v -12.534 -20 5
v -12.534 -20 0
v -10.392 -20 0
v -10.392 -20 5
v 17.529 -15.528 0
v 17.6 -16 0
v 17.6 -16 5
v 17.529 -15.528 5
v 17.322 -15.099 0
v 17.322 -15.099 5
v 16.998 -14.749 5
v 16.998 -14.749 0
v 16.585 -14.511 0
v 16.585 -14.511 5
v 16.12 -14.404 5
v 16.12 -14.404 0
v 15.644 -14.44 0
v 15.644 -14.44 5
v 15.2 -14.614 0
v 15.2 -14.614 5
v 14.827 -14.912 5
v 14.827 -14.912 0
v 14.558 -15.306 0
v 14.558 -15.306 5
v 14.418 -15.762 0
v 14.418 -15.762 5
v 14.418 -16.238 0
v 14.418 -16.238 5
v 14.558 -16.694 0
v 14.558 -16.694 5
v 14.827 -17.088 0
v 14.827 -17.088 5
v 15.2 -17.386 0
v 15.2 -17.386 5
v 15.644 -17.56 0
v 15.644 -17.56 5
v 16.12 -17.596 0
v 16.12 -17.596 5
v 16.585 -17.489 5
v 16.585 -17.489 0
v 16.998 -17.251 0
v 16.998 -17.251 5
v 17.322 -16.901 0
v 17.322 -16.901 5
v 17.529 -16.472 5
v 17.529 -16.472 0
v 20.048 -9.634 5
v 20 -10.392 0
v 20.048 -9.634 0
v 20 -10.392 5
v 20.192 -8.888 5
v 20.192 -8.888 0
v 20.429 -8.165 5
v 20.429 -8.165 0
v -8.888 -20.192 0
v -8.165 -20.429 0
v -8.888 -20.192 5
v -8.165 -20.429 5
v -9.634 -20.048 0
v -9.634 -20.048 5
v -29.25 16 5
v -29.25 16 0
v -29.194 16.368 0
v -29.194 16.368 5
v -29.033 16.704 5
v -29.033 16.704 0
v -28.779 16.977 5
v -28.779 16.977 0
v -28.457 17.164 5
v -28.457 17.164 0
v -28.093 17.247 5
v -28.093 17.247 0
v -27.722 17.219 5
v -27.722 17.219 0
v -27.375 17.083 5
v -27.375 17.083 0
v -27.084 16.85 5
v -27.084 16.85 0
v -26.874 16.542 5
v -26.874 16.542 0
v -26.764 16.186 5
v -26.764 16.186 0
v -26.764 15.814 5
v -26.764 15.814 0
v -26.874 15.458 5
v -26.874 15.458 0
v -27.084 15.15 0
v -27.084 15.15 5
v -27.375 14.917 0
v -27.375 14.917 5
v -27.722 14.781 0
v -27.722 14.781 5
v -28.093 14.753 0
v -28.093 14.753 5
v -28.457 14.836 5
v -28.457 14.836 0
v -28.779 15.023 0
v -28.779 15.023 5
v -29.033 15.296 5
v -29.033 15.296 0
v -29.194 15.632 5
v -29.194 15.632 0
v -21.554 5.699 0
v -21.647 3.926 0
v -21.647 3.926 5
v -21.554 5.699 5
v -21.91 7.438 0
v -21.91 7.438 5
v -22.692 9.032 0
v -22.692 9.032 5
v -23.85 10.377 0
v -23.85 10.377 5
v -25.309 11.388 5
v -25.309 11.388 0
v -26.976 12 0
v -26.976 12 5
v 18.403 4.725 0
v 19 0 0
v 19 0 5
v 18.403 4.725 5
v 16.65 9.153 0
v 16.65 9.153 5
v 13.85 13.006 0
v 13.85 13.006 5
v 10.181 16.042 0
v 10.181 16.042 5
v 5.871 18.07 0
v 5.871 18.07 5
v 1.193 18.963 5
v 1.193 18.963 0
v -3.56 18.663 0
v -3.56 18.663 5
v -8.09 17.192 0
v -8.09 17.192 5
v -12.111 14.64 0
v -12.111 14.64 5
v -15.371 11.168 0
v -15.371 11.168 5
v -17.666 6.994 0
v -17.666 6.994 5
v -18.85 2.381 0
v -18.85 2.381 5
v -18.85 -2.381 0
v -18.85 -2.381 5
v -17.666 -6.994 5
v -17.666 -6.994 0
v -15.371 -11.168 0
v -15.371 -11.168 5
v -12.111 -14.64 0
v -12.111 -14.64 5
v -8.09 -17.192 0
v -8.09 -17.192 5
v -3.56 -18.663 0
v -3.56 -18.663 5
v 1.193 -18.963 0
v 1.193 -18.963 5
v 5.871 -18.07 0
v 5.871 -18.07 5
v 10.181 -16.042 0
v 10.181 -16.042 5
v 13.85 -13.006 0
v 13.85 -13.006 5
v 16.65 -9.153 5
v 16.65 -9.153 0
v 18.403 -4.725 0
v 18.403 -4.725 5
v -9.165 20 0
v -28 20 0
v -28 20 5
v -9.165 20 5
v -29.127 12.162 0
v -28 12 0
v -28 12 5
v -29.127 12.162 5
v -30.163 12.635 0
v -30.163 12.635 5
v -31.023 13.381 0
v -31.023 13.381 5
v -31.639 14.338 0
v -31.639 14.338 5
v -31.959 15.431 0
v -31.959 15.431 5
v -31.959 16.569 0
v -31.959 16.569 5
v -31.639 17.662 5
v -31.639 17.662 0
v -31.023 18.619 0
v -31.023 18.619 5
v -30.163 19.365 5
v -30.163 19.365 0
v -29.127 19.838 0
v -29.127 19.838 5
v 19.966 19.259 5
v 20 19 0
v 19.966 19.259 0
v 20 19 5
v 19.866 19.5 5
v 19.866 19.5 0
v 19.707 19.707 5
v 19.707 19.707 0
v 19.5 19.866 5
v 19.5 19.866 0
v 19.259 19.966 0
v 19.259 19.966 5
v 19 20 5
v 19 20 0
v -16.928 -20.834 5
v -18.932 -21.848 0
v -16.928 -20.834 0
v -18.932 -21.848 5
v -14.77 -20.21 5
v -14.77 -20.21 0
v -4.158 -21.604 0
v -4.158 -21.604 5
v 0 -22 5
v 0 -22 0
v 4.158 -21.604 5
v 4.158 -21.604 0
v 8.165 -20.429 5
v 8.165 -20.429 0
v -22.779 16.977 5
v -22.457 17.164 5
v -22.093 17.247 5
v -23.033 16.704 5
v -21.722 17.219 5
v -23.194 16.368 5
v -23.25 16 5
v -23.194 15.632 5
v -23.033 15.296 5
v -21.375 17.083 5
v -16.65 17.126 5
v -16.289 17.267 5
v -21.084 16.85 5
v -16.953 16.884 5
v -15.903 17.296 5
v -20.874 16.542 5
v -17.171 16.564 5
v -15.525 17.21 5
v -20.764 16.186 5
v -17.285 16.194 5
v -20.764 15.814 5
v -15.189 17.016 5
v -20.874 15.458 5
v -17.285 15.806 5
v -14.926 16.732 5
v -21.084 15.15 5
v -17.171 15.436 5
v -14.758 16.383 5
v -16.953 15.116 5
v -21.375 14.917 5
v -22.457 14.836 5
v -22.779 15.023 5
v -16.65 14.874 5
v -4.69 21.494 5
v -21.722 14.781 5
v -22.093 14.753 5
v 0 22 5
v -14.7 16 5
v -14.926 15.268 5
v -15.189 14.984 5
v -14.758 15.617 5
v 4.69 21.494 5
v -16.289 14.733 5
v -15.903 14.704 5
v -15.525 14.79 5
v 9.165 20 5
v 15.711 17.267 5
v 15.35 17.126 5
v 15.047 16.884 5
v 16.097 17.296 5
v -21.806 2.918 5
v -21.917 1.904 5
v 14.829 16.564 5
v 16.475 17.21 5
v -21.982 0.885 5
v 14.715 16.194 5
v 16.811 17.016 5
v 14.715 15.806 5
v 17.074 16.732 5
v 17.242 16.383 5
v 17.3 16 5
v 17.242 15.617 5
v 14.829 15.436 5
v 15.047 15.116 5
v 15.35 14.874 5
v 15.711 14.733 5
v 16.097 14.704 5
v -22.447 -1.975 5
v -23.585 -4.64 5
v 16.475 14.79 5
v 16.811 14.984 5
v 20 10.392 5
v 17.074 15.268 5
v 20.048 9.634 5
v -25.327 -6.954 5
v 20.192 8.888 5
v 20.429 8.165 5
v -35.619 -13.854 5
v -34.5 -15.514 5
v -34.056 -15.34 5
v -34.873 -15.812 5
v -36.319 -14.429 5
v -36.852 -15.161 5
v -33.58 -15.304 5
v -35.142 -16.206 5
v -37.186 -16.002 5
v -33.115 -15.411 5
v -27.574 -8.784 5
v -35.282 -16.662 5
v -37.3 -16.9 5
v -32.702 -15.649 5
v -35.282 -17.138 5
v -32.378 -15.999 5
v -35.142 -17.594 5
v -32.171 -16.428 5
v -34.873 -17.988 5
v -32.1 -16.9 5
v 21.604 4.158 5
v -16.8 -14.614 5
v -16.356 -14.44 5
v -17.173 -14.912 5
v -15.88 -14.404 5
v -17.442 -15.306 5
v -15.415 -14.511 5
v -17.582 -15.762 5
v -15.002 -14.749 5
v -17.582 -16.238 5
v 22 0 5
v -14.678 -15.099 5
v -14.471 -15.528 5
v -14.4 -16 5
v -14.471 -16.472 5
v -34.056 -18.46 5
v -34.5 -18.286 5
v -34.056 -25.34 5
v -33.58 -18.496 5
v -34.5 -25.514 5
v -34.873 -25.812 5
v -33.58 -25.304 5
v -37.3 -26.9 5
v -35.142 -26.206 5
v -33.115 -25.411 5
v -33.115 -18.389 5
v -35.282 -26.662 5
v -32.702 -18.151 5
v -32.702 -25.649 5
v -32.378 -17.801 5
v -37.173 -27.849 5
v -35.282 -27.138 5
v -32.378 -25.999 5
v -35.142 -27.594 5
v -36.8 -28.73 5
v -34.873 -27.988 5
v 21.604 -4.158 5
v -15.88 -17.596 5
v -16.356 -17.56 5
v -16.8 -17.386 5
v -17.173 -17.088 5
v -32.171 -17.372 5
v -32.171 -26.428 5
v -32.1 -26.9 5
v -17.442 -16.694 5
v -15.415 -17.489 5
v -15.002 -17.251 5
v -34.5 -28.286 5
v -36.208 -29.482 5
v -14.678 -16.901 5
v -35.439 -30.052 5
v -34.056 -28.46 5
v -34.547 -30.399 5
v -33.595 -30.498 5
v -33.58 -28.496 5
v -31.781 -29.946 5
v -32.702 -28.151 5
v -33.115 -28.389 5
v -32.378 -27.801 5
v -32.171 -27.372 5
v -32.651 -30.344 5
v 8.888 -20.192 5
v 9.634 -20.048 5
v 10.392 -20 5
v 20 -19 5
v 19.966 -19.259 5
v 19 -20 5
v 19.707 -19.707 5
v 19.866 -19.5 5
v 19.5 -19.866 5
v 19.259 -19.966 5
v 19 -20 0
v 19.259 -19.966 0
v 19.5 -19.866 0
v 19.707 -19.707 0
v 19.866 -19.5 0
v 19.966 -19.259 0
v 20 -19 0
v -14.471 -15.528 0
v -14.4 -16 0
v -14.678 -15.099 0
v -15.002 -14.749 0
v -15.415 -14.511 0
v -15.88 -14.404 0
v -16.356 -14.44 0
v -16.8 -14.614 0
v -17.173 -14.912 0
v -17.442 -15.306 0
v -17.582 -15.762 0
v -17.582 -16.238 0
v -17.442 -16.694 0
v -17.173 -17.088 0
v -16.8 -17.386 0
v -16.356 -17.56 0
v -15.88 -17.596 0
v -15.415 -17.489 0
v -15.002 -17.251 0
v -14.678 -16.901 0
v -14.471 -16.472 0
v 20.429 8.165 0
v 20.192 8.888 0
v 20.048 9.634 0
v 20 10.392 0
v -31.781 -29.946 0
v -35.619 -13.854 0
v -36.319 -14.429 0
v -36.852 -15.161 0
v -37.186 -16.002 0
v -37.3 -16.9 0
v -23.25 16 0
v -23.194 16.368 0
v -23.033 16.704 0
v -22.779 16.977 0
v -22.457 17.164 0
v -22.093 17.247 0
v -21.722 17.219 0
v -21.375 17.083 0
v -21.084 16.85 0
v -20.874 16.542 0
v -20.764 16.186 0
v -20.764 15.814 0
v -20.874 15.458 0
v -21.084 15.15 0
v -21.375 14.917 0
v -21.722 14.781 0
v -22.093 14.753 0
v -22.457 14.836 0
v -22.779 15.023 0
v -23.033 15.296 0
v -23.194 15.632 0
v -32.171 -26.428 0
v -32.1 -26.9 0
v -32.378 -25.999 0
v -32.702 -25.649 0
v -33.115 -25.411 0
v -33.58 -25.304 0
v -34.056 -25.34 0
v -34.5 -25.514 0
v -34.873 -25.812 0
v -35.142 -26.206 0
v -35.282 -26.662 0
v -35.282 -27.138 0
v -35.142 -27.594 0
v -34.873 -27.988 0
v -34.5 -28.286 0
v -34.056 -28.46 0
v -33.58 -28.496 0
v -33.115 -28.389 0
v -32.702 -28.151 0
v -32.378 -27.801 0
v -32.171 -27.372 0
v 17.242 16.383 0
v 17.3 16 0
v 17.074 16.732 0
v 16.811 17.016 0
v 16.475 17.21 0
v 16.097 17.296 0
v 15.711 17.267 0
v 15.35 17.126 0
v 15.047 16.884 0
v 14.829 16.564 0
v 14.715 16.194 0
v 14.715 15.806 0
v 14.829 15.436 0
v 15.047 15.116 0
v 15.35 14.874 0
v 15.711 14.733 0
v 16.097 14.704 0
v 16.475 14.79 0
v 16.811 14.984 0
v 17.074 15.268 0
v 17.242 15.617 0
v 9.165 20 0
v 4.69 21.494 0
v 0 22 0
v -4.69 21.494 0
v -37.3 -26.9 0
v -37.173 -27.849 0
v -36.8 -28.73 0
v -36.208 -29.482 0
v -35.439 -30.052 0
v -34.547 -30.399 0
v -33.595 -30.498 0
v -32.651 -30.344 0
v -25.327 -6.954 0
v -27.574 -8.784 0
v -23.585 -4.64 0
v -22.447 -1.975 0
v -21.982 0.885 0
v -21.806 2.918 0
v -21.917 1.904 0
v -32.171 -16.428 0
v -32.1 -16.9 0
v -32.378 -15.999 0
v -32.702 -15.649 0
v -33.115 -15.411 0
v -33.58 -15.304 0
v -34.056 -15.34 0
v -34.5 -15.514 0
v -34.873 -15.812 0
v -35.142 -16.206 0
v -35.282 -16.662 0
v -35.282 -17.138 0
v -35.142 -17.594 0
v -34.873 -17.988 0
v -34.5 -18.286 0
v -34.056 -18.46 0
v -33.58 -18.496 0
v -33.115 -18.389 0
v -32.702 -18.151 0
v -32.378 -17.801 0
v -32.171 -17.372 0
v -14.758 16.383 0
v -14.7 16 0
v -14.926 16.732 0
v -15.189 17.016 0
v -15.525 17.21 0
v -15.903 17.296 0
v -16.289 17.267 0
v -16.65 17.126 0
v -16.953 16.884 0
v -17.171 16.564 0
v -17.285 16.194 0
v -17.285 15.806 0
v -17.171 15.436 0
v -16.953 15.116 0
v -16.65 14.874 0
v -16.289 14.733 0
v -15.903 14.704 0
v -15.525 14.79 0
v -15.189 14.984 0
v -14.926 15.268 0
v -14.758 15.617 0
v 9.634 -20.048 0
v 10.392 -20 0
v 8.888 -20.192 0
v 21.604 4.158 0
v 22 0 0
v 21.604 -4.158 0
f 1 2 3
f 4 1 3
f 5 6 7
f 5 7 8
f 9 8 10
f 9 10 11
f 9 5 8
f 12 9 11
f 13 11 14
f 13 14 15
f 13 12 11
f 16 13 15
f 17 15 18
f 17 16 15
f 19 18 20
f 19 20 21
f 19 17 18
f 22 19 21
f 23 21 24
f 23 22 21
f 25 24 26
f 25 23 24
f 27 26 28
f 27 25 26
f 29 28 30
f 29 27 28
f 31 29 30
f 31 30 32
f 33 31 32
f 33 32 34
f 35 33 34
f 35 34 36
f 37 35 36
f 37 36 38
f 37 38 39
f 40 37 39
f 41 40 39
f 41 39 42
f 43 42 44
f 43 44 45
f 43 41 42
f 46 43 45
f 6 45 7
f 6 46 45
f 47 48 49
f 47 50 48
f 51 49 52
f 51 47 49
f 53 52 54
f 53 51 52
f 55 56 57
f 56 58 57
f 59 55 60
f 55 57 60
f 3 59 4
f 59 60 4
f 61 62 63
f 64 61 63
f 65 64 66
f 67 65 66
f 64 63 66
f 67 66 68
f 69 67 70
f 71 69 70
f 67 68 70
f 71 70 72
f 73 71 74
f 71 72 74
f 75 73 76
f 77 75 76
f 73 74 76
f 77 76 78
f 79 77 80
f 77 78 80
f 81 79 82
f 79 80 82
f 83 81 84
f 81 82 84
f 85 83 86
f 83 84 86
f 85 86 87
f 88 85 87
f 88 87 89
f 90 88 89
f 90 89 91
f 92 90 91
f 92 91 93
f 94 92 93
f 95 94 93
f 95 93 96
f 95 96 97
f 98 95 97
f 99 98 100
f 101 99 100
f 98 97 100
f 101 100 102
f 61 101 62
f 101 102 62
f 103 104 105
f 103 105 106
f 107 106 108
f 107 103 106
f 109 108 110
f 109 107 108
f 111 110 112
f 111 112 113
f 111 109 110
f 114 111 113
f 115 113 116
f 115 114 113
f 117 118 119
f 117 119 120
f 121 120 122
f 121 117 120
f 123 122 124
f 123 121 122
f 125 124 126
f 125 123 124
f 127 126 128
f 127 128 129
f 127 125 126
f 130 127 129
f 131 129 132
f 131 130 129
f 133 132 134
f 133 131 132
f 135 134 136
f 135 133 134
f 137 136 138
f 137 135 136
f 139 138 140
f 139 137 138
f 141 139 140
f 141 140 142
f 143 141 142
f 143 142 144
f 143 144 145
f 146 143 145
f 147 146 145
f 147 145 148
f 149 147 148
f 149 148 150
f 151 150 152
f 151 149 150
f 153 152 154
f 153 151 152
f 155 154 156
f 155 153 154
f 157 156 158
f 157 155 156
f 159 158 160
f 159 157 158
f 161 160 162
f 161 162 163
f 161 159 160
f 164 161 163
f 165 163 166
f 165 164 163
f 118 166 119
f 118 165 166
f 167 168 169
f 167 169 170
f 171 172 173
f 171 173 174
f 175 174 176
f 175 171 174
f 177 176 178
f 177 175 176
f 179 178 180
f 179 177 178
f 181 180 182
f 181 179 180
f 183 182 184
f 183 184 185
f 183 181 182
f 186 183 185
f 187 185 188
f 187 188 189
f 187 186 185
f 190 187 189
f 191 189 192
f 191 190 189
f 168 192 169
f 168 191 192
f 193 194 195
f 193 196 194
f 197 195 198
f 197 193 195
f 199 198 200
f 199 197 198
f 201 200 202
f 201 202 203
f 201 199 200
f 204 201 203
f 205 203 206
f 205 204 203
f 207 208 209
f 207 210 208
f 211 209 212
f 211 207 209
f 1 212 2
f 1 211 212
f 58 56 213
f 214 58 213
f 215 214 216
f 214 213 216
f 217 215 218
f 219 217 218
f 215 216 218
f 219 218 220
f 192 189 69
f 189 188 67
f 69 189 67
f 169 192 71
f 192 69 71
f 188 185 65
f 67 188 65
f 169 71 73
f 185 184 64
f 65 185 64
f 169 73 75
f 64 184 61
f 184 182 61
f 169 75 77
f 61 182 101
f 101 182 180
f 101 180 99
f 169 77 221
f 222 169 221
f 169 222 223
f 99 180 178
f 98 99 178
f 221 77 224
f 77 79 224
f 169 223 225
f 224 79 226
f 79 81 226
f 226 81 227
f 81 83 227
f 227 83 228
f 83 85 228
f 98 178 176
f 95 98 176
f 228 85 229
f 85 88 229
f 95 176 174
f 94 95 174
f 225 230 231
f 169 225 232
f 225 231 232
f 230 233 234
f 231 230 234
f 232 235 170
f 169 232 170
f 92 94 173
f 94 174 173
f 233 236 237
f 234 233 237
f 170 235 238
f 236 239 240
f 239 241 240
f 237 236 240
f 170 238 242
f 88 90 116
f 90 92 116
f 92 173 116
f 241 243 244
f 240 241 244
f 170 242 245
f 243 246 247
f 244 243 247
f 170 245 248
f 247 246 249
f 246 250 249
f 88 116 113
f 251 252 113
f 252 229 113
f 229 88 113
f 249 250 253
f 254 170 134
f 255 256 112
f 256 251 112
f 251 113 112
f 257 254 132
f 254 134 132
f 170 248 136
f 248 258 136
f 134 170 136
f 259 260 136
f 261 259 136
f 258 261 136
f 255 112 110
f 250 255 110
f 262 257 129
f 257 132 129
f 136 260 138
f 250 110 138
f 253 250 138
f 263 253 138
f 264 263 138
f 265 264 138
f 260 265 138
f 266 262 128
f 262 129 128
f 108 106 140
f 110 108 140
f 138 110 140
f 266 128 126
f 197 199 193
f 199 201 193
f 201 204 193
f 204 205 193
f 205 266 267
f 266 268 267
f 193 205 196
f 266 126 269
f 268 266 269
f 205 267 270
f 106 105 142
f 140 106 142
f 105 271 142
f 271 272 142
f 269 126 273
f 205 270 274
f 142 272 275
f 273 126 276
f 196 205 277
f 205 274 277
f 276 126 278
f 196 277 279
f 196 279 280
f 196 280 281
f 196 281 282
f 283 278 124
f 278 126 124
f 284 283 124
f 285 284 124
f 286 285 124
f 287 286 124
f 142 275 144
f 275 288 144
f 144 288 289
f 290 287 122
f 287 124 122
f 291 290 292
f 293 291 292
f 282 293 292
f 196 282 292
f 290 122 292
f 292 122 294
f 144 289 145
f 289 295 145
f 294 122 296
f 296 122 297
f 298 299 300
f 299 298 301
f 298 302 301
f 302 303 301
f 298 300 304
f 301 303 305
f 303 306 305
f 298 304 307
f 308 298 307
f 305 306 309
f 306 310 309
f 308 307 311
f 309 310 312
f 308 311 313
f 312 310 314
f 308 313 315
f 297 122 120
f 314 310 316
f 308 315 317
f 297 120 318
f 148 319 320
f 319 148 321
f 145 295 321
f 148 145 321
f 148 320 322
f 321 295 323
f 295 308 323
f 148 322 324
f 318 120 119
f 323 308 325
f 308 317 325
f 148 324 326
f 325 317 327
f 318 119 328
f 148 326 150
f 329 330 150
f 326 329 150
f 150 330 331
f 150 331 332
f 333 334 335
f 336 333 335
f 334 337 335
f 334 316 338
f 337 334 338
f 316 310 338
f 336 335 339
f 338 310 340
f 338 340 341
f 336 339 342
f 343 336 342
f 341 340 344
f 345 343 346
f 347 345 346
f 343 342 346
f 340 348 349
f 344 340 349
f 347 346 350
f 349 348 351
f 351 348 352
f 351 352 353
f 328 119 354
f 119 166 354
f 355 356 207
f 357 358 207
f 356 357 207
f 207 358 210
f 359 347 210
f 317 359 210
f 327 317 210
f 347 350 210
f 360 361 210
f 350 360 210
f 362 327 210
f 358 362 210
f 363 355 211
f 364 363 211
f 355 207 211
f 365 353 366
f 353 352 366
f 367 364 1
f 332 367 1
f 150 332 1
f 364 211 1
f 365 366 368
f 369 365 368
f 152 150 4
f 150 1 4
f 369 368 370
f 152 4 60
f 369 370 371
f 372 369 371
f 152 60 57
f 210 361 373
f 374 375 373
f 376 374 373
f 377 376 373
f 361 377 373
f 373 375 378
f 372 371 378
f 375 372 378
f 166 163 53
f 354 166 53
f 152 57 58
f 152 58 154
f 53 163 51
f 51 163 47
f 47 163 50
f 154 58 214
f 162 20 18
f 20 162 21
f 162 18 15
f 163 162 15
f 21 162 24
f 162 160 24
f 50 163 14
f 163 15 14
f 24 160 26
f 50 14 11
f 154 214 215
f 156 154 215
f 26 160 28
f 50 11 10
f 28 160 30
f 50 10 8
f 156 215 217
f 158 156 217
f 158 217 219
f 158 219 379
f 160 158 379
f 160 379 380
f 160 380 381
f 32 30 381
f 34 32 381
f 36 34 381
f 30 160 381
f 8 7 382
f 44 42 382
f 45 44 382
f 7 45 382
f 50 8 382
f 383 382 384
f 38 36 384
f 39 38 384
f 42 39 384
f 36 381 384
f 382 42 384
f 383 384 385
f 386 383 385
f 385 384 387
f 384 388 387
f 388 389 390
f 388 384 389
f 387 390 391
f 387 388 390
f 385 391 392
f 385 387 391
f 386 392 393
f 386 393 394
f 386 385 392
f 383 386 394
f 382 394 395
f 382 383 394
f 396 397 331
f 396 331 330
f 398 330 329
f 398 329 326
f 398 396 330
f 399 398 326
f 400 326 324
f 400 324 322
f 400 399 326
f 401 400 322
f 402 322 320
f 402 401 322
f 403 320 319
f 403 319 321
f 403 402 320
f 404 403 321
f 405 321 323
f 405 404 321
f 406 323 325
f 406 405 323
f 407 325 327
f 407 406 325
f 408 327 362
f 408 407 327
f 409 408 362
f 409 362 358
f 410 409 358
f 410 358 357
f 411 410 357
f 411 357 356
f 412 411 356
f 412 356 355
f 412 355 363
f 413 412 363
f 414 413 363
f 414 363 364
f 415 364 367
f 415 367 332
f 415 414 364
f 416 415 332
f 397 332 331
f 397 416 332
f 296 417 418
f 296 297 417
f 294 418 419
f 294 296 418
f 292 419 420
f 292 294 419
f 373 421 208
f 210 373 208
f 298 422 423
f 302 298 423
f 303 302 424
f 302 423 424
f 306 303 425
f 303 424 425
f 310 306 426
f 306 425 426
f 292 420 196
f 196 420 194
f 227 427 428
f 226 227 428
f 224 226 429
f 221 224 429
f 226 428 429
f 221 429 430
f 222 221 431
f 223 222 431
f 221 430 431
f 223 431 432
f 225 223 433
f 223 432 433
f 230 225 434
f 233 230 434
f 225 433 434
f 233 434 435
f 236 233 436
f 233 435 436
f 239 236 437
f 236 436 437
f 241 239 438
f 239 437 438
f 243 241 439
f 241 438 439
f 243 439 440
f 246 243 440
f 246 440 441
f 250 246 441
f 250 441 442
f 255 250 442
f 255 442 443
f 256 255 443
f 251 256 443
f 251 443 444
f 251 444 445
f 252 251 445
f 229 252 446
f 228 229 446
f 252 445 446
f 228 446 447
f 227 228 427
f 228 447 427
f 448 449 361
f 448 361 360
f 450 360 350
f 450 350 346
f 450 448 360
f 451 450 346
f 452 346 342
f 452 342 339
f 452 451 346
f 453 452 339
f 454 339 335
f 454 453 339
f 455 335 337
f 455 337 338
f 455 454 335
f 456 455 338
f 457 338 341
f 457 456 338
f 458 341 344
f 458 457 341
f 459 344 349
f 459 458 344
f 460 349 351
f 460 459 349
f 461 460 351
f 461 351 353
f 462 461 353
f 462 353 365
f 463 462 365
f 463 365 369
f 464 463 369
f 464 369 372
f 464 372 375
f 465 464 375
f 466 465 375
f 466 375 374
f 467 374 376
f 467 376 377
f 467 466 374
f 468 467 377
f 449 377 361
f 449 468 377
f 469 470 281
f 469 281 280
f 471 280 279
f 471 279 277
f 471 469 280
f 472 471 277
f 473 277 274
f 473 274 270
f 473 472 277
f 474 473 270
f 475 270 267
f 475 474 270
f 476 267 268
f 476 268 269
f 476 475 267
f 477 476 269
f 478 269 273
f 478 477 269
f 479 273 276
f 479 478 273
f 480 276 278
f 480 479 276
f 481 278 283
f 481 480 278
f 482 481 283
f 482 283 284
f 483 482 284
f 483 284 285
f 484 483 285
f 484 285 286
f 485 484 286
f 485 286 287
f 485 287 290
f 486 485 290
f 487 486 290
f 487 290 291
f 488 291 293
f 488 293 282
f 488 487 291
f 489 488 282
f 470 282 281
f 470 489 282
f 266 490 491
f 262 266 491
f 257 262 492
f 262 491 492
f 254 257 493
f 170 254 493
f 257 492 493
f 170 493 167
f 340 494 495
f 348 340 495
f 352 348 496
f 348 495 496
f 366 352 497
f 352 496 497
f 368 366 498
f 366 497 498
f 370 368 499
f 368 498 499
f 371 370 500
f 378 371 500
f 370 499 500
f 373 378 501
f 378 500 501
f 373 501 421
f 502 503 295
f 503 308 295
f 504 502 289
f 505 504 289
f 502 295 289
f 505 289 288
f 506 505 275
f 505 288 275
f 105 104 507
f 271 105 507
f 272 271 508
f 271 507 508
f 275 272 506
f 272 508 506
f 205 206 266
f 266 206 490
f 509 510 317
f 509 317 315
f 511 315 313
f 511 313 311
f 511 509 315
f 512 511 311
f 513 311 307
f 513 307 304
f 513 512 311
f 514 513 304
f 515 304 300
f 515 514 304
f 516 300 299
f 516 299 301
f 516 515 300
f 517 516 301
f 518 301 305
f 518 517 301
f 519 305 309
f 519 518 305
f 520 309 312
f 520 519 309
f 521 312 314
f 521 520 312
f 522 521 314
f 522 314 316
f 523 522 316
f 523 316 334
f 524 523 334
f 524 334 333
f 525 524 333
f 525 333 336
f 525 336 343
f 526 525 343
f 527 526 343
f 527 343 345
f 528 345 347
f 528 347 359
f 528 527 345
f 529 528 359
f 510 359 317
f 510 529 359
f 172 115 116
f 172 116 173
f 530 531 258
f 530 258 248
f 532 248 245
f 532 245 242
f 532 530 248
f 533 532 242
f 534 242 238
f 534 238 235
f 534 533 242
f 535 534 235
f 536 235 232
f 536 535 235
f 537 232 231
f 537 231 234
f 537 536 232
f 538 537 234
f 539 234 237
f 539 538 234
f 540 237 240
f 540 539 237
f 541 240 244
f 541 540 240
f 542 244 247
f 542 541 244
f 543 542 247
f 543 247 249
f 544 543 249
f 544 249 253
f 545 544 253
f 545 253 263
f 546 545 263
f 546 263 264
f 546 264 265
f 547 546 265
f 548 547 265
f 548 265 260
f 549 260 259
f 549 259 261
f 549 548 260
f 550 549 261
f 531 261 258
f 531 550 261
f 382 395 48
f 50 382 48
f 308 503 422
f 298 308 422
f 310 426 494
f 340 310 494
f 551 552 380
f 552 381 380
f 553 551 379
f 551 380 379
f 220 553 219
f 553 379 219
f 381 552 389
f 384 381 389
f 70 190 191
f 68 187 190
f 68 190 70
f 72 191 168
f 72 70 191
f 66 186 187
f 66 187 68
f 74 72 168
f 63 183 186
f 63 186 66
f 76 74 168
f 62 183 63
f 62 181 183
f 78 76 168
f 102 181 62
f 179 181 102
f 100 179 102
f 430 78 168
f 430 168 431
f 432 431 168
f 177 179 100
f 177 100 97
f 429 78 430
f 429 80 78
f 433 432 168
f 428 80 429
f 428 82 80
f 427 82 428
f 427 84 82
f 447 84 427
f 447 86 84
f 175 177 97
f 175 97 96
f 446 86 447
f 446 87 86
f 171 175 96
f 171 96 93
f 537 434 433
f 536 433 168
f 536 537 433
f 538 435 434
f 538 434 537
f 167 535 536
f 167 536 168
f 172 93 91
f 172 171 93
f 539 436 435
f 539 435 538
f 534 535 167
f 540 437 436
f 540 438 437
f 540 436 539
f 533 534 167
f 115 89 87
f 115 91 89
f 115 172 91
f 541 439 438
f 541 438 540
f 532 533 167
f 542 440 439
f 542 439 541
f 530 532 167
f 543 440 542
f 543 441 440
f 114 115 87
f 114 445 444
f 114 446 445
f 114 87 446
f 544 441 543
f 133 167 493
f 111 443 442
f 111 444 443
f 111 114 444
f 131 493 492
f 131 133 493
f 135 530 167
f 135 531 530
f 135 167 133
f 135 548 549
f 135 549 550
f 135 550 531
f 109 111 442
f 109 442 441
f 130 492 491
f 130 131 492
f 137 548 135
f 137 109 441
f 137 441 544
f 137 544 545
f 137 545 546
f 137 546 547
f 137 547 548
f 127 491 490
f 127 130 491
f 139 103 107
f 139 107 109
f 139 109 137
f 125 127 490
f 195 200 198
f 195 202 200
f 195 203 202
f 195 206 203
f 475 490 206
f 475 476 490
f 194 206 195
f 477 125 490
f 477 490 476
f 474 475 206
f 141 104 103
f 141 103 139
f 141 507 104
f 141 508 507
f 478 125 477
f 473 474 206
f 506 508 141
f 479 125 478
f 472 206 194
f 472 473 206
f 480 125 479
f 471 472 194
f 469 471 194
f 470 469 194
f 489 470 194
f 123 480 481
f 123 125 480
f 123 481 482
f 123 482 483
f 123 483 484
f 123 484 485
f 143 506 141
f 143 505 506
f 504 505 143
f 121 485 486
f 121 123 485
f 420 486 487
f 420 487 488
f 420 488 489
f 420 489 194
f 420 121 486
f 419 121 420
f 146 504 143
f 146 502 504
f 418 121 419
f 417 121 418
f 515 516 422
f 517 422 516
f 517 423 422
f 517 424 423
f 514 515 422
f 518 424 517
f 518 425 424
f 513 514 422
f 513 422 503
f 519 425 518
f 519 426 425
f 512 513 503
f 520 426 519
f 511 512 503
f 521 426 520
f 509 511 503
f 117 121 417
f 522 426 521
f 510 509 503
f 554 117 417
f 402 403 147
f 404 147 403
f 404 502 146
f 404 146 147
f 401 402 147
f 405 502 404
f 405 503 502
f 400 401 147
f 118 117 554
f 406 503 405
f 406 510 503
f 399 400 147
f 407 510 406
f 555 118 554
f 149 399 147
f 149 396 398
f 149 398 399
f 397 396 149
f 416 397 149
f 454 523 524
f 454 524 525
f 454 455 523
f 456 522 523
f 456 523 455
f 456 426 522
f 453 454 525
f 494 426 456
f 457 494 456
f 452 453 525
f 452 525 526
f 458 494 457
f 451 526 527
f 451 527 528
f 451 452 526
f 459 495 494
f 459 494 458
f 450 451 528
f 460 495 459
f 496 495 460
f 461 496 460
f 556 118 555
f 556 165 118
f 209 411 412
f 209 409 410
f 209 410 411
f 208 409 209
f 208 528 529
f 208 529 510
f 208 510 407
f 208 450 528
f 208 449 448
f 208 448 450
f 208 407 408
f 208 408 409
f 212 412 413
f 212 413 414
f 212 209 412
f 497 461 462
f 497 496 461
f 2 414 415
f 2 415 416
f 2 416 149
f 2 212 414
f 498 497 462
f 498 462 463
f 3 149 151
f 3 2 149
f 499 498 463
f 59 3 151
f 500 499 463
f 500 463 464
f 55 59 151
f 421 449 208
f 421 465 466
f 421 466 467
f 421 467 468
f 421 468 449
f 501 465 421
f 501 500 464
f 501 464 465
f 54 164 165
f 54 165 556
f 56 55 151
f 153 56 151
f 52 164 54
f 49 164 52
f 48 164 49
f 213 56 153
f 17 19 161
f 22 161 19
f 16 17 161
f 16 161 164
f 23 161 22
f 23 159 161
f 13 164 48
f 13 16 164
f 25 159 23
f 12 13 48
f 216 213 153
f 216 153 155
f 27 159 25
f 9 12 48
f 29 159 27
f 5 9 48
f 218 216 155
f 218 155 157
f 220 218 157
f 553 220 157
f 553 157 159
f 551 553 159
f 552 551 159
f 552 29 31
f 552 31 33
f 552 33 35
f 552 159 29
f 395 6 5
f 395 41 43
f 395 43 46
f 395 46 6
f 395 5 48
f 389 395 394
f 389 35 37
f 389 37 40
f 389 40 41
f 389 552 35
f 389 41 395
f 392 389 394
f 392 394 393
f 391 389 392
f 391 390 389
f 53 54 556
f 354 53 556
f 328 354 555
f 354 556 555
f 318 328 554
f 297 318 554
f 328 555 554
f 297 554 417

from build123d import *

# Parameters (mm, degrees)
SKETCH1_R           = 19
SKETCH1_R_2         = 1.6
SKETCH1_R_3         = 1.3
BOSS_EXTRUDE1_DEPTH = 5
FILLET1_R           = 12
FILLET3_R           = 12
FILLET4_R           = 1
FILLET5_R           = 6
SKETCH6_R           = 1.25
BOSS_EXTRUDE3_DEPTH = 5
FILLET6_R           = 10
FILLET8_R           = 7


with BuildPart() as part:
    # Sketch1 → Boss-Extrude1 (new body)
    with BuildSketch(Plane.XY):
        with BuildLine():
            Line((-37.3, -16.9), (-37.3, -26.9))
            ThreePointArc((-37.3, -26.9), (-35.439240178, -30.051990419), (-31.780531331, -29.945593543))
            Line((-31.780531331, -29.945593543), (-16, -20))
            Line((-16, -20), (-9.16515139, -20))
            ThreePointArc((-9.16515139, -20), (0, -22), (9.16515139, -20))
            Line((9.16515139, -20), (20, -20))
            Line((20, -20), (20, -9.16515139))
            ThreePointArc((20, -9.16515139), (22, 0), (20, 9.16515139))
            Line((20, 9.16515139), (20, 20))
            Line((20, 20), (9.16515139, 20))
            ThreePointArc((9.16515139, 20), (0, 22), (-9.16515139, 20))
            Line((-9.16515139, 20), (-20, 20))
            Line((-20, 20), (-20, 9.16515139))
            ThreePointArc((-20, 9.16515139), (-21.885463921, 2.241978803), (-21.442870984, -4.91968332))
            Line((-21.442870984, -4.91968332), (-35.619468669, -13.854406457))
            ThreePointArc((-35.619468669, -13.854406457), (-36.851990419, -15.160759822), (-37.3, -16.9))
        make_face()
        Circle(SKETCH1_R, mode=Mode.SUBTRACT)
        with Locations((-33.7, -16.9)):
            Circle(SKETCH1_R_2, mode=Mode.SUBTRACT)
        with Locations((-33.7, -26.9)):
            Circle(SKETCH1_R_2, mode=Mode.SUBTRACT)
        with Locations((-16, 16)):
            Circle(SKETCH1_R_3, mode=Mode.SUBTRACT)
        with Locations((16, 16)):
            Circle(SKETCH1_R_3, mode=Mode.SUBTRACT)
        with Locations((16, -16)):
            Circle(SKETCH1_R_2, mode=Mode.SUBTRACT)
        with Locations((-16, -16)):
            Circle(SKETCH1_R_2, mode=Mode.SUBTRACT)
    extrude(amount=BOSS_EXTRUDE1_DEPTH)

    # Fillet1
    fillet1_edges = [part.edges().sort_by_distance(p)[0] for p in [
        (-21.442870984, -4.91968332, 2.5),
    ]]
    fillet(fillet1_edges, radius=FILLET1_R)

    # Fillet3
    fillet3_edges = [part.edges().sort_by_distance(p)[0] for p in [
        (-16, -20, 2.5),
    ]]
    fillet(fillet3_edges, radius=FILLET3_R)

    # Fillet4
    fillet4_edges = [part.edges().sort_by_distance(p)[0] for p in [
        (20, 20, 2.5),
        (20, -20, 2.5),
    ]]
    fillet(fillet4_edges, radius=FILLET4_R)

    # Fillet5
    fillet5_edges = [part.edges().sort_by_distance(p)[0] for p in [
        (9.16515139, -20, 2.5),
        (-9.16515139, -20, 2.5),
        (20, 9.16515139, 2.5),
        (20, -9.16515139, 2.5),
    ]]
    fillet(fillet5_edges, radius=FILLET5_R)

    # Sketch6 → Boss-Extrude3 (add)
    with BuildSketch(Plane(origin=(0, 0, 0), x_dir=(-1, 0, 0), z_dir=(0, 0, -1))):
        with BuildLine():
            Line((22, 20), (20, 20))
            Line((20, 20), (20, 12))
            Line((20, 12), (22, 12))
            Line((22, 12), (28, 12))
            ThreePointArc((28, 12), (32, 16), (28, 20))
            Line((28, 20), (22, 20))
        make_face()
        with Locations((22, 16)):
            Circle(SKETCH6_R, mode=Mode.SUBTRACT)
        with Locations((28, 16)):
            Circle(SKETCH6_R, mode=Mode.SUBTRACT)
    extrude(amount=-BOSS_EXTRUDE3_DEPTH)

    # Fillet6
    # the kernel refuses this fillet: 10 mm, written as the material it adds along each edge
    with BuildSketch(Plane(origin=(-20, 12, 0), x_dir=(0, -1, 0), z_dir=(0, 0, 1))) as fillet6_piece_1:
        with BuildLine():
            CenterArc((10, -6.975715416), FILLET6_R, 135.767508297, 44.232491703)
            Line((0, -6.975715416), (-0.2, -6.975715416))
            Line((-0.2, -6.975715416), (-0.2, 0))
            Line((-0.2, 0), (0, 0.2))
            ThreePointArc((0, 0.2), (1.417424305, 0.2), (2.691545582, 0.139514308))
            Line((2.691545582, 0.139514308), (2.83484861, 0))
        make_face()
    extrude(amount=5)

    # Fillet8
    # the kernel refuses this fillet: 7 mm, written as the material it adds along each edge
    with BuildSketch(Plane(origin=(-20, 9.16515139, 0), x_dir=(-0.9264219176463756, 0.3764869592753673, 0), z_dir=(0, 0, 1))) as fillet8_piece_1:
        with BuildLine():
            CenterArc((6.404489612, 6.90896616), FILLET8_R, 191.835369606, 87.415058428)
            ThreePointArc((-0.446697133, 5.473264176), (-0.051904318, 2.750624406), (0, 0))
            ThreePointArc((0, 0), (3.764869593, -0.735780824), (7.529739186, 0))
        make_face()
    extrude(amount=5)


solid = part.part
